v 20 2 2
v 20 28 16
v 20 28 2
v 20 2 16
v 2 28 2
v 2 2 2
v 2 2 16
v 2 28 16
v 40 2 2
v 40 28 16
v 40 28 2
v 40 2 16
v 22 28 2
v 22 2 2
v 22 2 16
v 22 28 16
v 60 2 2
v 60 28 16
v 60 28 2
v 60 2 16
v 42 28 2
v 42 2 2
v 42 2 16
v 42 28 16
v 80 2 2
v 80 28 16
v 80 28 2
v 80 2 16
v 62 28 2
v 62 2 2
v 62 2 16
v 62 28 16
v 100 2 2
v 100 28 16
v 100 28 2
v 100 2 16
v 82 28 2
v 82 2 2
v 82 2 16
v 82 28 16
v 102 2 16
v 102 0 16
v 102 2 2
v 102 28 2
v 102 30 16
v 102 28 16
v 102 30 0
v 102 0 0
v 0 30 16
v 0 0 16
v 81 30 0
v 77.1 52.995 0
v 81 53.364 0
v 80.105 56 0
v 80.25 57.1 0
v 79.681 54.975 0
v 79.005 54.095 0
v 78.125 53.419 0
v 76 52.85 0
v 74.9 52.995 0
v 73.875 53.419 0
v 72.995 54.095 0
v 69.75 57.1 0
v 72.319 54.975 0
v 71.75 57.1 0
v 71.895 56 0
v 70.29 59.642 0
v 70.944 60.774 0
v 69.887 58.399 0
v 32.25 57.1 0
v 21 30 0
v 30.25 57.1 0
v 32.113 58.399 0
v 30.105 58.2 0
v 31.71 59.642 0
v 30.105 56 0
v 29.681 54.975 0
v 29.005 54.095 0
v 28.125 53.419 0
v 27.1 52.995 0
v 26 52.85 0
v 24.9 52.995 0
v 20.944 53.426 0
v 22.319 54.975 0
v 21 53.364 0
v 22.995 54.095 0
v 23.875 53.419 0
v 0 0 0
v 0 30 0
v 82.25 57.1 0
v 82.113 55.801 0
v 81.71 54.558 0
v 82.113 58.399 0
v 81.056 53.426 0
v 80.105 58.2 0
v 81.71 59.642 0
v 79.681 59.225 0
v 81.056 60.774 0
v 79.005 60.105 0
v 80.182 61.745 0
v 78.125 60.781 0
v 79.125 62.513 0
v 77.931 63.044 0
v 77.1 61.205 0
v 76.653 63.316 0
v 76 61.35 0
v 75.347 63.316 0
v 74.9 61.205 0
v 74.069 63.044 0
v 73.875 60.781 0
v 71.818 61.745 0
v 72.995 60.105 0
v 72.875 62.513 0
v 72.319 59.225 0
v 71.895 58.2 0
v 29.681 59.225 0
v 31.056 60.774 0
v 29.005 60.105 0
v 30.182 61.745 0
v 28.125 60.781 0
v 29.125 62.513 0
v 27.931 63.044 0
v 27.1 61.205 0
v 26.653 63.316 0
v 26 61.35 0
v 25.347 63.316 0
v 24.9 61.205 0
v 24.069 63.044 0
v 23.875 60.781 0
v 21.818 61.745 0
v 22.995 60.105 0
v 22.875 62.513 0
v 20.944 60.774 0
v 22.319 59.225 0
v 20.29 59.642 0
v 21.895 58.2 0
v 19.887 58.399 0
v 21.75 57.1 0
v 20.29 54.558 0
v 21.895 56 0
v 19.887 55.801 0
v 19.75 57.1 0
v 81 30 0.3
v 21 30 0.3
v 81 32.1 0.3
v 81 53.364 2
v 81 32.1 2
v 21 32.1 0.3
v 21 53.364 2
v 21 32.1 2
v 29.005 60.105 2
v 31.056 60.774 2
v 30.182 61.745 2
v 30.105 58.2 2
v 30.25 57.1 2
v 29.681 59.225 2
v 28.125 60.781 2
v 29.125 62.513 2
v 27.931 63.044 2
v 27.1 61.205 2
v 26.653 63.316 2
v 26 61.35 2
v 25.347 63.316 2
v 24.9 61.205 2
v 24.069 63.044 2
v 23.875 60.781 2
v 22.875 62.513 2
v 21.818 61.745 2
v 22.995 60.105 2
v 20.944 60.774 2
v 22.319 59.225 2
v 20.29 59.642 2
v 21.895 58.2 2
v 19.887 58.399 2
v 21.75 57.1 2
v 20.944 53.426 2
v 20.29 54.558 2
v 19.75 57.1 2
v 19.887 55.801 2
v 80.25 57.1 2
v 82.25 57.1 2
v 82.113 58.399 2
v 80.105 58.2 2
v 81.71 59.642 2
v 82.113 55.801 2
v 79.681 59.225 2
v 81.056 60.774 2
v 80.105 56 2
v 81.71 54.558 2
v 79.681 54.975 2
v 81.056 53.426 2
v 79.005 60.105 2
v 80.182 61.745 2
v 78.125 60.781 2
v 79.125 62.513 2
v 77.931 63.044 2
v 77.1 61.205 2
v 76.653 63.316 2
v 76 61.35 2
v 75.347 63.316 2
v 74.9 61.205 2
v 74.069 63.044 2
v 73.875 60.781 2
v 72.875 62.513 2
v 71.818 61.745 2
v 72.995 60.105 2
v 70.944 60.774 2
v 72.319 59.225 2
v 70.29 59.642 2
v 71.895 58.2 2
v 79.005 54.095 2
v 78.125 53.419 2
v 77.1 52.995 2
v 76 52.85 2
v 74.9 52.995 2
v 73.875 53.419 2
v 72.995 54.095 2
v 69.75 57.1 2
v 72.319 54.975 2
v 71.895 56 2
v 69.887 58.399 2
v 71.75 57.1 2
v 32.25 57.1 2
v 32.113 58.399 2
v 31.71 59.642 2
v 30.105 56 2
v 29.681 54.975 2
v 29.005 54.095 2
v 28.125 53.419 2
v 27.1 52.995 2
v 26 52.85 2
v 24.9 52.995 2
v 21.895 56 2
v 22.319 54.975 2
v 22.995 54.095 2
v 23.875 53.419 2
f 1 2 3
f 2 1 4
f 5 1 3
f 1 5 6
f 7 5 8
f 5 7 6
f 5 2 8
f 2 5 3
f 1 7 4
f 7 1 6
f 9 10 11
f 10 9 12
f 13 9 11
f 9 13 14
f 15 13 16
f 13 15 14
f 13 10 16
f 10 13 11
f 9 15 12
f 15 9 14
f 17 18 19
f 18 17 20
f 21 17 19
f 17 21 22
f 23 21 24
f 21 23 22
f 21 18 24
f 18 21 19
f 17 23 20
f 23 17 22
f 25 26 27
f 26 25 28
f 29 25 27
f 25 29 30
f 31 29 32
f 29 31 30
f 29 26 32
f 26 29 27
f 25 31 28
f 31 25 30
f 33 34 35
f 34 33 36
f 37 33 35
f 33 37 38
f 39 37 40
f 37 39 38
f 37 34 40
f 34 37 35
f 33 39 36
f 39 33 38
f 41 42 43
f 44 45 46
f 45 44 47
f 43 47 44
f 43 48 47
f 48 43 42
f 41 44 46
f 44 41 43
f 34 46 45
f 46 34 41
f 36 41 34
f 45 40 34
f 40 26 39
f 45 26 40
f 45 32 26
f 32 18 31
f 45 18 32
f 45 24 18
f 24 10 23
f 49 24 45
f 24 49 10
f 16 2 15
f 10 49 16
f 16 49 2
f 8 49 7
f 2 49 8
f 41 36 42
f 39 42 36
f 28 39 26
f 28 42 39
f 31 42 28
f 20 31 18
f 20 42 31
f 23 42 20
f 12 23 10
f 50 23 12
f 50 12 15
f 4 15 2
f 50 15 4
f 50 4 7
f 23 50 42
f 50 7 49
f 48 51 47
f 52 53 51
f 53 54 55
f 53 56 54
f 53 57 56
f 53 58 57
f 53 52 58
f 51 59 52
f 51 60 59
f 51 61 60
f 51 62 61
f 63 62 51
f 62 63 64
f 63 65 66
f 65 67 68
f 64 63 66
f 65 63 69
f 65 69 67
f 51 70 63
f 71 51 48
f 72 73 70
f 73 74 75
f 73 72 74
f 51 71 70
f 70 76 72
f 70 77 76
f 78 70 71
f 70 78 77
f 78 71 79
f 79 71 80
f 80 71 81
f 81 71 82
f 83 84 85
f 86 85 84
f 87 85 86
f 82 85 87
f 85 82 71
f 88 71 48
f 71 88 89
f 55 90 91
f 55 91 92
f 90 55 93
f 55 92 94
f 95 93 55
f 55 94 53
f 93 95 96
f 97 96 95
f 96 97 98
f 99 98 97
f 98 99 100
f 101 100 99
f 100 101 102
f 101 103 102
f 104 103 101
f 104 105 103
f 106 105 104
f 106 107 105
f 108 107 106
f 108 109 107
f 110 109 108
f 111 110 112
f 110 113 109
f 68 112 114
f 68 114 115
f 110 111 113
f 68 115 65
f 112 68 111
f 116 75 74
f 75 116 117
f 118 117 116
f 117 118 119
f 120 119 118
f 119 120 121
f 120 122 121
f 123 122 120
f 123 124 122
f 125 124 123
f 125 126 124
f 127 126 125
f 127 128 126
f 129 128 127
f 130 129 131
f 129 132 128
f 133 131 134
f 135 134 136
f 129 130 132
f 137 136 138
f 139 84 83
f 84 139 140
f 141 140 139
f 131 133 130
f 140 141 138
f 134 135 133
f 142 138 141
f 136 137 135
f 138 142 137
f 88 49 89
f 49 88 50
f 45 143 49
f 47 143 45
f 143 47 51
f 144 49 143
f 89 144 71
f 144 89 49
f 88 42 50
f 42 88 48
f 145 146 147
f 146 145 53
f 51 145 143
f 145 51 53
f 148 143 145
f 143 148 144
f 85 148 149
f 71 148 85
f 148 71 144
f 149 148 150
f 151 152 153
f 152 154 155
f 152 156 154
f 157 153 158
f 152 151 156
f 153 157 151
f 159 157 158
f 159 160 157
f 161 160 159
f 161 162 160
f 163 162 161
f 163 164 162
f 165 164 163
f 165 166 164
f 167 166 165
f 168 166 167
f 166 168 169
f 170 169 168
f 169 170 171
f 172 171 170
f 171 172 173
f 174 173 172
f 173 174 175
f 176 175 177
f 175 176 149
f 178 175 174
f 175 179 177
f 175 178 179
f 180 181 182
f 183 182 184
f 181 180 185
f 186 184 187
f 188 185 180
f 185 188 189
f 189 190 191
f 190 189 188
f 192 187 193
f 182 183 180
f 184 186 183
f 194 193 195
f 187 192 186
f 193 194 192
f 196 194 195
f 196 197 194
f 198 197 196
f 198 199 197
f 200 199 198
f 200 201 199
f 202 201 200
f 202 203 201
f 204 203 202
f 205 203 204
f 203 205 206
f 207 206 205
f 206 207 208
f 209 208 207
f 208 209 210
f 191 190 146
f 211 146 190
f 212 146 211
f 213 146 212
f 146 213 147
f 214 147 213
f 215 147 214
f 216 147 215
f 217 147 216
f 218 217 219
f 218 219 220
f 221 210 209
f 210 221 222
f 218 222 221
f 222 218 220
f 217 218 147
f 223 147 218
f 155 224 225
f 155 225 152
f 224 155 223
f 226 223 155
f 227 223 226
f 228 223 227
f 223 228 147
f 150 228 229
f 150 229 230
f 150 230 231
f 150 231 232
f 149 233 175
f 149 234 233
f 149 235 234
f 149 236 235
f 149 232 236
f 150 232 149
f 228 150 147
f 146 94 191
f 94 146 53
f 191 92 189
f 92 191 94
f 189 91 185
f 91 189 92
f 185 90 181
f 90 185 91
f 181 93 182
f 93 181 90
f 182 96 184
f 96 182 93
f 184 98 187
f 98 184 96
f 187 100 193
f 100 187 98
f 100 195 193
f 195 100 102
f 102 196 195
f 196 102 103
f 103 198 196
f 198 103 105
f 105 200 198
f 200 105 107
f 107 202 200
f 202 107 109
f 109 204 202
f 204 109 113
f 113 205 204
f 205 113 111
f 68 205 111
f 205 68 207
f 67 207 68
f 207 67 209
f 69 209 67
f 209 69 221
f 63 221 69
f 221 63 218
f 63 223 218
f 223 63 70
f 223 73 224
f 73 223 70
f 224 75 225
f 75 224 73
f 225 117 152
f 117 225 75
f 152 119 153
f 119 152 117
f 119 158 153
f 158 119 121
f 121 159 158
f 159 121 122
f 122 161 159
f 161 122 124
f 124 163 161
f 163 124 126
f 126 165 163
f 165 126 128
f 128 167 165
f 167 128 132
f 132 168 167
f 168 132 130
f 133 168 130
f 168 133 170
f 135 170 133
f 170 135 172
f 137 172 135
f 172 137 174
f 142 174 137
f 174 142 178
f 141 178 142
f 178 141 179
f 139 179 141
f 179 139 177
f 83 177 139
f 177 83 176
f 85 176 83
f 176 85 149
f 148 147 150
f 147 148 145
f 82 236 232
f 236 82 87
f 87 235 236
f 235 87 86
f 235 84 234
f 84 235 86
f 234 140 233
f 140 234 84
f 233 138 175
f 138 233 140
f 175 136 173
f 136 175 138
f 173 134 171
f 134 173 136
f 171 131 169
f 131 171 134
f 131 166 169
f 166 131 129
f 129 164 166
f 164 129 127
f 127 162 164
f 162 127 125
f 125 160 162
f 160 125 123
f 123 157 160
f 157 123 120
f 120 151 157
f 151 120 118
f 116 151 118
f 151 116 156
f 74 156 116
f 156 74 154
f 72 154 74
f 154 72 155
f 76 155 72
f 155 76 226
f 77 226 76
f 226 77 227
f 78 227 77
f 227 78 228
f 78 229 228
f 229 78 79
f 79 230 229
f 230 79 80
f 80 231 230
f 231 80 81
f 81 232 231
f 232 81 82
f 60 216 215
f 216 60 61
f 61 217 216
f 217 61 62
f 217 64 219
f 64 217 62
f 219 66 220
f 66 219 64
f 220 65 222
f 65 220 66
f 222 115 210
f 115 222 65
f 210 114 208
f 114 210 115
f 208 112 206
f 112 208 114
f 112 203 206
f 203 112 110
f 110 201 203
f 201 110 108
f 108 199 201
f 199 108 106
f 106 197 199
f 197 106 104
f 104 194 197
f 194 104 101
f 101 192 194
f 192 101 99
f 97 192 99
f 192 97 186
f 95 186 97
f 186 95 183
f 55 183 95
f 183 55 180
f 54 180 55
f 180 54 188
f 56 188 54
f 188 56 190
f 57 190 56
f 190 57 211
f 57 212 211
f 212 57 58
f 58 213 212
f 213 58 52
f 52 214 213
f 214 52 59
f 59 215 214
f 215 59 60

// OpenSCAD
difference() {
  cube([102,30,16]);
  for(x=[0:5])
    translate([2+20*x,2,2]) cube([18,26,20]);
}
translate([21,30]) {
  cube([60,3,0.3]);
  translate([0,2.1]) rotate([0,0]) difference() {
    linear_extrude(2,convexity=3) {
      difference() { union() {
      square([60,25]);
      *translate([5,20]) square([50,5]);
      translate([5,25]) circle(d=12.5,$fn=30);
      translate([55,25]) circle(d=12.5,$fn=30);
      }
      for(x=[5,55])
        translate([x,25]) circle(d=8.5,$fn=24);
    }
  }
  }
}
